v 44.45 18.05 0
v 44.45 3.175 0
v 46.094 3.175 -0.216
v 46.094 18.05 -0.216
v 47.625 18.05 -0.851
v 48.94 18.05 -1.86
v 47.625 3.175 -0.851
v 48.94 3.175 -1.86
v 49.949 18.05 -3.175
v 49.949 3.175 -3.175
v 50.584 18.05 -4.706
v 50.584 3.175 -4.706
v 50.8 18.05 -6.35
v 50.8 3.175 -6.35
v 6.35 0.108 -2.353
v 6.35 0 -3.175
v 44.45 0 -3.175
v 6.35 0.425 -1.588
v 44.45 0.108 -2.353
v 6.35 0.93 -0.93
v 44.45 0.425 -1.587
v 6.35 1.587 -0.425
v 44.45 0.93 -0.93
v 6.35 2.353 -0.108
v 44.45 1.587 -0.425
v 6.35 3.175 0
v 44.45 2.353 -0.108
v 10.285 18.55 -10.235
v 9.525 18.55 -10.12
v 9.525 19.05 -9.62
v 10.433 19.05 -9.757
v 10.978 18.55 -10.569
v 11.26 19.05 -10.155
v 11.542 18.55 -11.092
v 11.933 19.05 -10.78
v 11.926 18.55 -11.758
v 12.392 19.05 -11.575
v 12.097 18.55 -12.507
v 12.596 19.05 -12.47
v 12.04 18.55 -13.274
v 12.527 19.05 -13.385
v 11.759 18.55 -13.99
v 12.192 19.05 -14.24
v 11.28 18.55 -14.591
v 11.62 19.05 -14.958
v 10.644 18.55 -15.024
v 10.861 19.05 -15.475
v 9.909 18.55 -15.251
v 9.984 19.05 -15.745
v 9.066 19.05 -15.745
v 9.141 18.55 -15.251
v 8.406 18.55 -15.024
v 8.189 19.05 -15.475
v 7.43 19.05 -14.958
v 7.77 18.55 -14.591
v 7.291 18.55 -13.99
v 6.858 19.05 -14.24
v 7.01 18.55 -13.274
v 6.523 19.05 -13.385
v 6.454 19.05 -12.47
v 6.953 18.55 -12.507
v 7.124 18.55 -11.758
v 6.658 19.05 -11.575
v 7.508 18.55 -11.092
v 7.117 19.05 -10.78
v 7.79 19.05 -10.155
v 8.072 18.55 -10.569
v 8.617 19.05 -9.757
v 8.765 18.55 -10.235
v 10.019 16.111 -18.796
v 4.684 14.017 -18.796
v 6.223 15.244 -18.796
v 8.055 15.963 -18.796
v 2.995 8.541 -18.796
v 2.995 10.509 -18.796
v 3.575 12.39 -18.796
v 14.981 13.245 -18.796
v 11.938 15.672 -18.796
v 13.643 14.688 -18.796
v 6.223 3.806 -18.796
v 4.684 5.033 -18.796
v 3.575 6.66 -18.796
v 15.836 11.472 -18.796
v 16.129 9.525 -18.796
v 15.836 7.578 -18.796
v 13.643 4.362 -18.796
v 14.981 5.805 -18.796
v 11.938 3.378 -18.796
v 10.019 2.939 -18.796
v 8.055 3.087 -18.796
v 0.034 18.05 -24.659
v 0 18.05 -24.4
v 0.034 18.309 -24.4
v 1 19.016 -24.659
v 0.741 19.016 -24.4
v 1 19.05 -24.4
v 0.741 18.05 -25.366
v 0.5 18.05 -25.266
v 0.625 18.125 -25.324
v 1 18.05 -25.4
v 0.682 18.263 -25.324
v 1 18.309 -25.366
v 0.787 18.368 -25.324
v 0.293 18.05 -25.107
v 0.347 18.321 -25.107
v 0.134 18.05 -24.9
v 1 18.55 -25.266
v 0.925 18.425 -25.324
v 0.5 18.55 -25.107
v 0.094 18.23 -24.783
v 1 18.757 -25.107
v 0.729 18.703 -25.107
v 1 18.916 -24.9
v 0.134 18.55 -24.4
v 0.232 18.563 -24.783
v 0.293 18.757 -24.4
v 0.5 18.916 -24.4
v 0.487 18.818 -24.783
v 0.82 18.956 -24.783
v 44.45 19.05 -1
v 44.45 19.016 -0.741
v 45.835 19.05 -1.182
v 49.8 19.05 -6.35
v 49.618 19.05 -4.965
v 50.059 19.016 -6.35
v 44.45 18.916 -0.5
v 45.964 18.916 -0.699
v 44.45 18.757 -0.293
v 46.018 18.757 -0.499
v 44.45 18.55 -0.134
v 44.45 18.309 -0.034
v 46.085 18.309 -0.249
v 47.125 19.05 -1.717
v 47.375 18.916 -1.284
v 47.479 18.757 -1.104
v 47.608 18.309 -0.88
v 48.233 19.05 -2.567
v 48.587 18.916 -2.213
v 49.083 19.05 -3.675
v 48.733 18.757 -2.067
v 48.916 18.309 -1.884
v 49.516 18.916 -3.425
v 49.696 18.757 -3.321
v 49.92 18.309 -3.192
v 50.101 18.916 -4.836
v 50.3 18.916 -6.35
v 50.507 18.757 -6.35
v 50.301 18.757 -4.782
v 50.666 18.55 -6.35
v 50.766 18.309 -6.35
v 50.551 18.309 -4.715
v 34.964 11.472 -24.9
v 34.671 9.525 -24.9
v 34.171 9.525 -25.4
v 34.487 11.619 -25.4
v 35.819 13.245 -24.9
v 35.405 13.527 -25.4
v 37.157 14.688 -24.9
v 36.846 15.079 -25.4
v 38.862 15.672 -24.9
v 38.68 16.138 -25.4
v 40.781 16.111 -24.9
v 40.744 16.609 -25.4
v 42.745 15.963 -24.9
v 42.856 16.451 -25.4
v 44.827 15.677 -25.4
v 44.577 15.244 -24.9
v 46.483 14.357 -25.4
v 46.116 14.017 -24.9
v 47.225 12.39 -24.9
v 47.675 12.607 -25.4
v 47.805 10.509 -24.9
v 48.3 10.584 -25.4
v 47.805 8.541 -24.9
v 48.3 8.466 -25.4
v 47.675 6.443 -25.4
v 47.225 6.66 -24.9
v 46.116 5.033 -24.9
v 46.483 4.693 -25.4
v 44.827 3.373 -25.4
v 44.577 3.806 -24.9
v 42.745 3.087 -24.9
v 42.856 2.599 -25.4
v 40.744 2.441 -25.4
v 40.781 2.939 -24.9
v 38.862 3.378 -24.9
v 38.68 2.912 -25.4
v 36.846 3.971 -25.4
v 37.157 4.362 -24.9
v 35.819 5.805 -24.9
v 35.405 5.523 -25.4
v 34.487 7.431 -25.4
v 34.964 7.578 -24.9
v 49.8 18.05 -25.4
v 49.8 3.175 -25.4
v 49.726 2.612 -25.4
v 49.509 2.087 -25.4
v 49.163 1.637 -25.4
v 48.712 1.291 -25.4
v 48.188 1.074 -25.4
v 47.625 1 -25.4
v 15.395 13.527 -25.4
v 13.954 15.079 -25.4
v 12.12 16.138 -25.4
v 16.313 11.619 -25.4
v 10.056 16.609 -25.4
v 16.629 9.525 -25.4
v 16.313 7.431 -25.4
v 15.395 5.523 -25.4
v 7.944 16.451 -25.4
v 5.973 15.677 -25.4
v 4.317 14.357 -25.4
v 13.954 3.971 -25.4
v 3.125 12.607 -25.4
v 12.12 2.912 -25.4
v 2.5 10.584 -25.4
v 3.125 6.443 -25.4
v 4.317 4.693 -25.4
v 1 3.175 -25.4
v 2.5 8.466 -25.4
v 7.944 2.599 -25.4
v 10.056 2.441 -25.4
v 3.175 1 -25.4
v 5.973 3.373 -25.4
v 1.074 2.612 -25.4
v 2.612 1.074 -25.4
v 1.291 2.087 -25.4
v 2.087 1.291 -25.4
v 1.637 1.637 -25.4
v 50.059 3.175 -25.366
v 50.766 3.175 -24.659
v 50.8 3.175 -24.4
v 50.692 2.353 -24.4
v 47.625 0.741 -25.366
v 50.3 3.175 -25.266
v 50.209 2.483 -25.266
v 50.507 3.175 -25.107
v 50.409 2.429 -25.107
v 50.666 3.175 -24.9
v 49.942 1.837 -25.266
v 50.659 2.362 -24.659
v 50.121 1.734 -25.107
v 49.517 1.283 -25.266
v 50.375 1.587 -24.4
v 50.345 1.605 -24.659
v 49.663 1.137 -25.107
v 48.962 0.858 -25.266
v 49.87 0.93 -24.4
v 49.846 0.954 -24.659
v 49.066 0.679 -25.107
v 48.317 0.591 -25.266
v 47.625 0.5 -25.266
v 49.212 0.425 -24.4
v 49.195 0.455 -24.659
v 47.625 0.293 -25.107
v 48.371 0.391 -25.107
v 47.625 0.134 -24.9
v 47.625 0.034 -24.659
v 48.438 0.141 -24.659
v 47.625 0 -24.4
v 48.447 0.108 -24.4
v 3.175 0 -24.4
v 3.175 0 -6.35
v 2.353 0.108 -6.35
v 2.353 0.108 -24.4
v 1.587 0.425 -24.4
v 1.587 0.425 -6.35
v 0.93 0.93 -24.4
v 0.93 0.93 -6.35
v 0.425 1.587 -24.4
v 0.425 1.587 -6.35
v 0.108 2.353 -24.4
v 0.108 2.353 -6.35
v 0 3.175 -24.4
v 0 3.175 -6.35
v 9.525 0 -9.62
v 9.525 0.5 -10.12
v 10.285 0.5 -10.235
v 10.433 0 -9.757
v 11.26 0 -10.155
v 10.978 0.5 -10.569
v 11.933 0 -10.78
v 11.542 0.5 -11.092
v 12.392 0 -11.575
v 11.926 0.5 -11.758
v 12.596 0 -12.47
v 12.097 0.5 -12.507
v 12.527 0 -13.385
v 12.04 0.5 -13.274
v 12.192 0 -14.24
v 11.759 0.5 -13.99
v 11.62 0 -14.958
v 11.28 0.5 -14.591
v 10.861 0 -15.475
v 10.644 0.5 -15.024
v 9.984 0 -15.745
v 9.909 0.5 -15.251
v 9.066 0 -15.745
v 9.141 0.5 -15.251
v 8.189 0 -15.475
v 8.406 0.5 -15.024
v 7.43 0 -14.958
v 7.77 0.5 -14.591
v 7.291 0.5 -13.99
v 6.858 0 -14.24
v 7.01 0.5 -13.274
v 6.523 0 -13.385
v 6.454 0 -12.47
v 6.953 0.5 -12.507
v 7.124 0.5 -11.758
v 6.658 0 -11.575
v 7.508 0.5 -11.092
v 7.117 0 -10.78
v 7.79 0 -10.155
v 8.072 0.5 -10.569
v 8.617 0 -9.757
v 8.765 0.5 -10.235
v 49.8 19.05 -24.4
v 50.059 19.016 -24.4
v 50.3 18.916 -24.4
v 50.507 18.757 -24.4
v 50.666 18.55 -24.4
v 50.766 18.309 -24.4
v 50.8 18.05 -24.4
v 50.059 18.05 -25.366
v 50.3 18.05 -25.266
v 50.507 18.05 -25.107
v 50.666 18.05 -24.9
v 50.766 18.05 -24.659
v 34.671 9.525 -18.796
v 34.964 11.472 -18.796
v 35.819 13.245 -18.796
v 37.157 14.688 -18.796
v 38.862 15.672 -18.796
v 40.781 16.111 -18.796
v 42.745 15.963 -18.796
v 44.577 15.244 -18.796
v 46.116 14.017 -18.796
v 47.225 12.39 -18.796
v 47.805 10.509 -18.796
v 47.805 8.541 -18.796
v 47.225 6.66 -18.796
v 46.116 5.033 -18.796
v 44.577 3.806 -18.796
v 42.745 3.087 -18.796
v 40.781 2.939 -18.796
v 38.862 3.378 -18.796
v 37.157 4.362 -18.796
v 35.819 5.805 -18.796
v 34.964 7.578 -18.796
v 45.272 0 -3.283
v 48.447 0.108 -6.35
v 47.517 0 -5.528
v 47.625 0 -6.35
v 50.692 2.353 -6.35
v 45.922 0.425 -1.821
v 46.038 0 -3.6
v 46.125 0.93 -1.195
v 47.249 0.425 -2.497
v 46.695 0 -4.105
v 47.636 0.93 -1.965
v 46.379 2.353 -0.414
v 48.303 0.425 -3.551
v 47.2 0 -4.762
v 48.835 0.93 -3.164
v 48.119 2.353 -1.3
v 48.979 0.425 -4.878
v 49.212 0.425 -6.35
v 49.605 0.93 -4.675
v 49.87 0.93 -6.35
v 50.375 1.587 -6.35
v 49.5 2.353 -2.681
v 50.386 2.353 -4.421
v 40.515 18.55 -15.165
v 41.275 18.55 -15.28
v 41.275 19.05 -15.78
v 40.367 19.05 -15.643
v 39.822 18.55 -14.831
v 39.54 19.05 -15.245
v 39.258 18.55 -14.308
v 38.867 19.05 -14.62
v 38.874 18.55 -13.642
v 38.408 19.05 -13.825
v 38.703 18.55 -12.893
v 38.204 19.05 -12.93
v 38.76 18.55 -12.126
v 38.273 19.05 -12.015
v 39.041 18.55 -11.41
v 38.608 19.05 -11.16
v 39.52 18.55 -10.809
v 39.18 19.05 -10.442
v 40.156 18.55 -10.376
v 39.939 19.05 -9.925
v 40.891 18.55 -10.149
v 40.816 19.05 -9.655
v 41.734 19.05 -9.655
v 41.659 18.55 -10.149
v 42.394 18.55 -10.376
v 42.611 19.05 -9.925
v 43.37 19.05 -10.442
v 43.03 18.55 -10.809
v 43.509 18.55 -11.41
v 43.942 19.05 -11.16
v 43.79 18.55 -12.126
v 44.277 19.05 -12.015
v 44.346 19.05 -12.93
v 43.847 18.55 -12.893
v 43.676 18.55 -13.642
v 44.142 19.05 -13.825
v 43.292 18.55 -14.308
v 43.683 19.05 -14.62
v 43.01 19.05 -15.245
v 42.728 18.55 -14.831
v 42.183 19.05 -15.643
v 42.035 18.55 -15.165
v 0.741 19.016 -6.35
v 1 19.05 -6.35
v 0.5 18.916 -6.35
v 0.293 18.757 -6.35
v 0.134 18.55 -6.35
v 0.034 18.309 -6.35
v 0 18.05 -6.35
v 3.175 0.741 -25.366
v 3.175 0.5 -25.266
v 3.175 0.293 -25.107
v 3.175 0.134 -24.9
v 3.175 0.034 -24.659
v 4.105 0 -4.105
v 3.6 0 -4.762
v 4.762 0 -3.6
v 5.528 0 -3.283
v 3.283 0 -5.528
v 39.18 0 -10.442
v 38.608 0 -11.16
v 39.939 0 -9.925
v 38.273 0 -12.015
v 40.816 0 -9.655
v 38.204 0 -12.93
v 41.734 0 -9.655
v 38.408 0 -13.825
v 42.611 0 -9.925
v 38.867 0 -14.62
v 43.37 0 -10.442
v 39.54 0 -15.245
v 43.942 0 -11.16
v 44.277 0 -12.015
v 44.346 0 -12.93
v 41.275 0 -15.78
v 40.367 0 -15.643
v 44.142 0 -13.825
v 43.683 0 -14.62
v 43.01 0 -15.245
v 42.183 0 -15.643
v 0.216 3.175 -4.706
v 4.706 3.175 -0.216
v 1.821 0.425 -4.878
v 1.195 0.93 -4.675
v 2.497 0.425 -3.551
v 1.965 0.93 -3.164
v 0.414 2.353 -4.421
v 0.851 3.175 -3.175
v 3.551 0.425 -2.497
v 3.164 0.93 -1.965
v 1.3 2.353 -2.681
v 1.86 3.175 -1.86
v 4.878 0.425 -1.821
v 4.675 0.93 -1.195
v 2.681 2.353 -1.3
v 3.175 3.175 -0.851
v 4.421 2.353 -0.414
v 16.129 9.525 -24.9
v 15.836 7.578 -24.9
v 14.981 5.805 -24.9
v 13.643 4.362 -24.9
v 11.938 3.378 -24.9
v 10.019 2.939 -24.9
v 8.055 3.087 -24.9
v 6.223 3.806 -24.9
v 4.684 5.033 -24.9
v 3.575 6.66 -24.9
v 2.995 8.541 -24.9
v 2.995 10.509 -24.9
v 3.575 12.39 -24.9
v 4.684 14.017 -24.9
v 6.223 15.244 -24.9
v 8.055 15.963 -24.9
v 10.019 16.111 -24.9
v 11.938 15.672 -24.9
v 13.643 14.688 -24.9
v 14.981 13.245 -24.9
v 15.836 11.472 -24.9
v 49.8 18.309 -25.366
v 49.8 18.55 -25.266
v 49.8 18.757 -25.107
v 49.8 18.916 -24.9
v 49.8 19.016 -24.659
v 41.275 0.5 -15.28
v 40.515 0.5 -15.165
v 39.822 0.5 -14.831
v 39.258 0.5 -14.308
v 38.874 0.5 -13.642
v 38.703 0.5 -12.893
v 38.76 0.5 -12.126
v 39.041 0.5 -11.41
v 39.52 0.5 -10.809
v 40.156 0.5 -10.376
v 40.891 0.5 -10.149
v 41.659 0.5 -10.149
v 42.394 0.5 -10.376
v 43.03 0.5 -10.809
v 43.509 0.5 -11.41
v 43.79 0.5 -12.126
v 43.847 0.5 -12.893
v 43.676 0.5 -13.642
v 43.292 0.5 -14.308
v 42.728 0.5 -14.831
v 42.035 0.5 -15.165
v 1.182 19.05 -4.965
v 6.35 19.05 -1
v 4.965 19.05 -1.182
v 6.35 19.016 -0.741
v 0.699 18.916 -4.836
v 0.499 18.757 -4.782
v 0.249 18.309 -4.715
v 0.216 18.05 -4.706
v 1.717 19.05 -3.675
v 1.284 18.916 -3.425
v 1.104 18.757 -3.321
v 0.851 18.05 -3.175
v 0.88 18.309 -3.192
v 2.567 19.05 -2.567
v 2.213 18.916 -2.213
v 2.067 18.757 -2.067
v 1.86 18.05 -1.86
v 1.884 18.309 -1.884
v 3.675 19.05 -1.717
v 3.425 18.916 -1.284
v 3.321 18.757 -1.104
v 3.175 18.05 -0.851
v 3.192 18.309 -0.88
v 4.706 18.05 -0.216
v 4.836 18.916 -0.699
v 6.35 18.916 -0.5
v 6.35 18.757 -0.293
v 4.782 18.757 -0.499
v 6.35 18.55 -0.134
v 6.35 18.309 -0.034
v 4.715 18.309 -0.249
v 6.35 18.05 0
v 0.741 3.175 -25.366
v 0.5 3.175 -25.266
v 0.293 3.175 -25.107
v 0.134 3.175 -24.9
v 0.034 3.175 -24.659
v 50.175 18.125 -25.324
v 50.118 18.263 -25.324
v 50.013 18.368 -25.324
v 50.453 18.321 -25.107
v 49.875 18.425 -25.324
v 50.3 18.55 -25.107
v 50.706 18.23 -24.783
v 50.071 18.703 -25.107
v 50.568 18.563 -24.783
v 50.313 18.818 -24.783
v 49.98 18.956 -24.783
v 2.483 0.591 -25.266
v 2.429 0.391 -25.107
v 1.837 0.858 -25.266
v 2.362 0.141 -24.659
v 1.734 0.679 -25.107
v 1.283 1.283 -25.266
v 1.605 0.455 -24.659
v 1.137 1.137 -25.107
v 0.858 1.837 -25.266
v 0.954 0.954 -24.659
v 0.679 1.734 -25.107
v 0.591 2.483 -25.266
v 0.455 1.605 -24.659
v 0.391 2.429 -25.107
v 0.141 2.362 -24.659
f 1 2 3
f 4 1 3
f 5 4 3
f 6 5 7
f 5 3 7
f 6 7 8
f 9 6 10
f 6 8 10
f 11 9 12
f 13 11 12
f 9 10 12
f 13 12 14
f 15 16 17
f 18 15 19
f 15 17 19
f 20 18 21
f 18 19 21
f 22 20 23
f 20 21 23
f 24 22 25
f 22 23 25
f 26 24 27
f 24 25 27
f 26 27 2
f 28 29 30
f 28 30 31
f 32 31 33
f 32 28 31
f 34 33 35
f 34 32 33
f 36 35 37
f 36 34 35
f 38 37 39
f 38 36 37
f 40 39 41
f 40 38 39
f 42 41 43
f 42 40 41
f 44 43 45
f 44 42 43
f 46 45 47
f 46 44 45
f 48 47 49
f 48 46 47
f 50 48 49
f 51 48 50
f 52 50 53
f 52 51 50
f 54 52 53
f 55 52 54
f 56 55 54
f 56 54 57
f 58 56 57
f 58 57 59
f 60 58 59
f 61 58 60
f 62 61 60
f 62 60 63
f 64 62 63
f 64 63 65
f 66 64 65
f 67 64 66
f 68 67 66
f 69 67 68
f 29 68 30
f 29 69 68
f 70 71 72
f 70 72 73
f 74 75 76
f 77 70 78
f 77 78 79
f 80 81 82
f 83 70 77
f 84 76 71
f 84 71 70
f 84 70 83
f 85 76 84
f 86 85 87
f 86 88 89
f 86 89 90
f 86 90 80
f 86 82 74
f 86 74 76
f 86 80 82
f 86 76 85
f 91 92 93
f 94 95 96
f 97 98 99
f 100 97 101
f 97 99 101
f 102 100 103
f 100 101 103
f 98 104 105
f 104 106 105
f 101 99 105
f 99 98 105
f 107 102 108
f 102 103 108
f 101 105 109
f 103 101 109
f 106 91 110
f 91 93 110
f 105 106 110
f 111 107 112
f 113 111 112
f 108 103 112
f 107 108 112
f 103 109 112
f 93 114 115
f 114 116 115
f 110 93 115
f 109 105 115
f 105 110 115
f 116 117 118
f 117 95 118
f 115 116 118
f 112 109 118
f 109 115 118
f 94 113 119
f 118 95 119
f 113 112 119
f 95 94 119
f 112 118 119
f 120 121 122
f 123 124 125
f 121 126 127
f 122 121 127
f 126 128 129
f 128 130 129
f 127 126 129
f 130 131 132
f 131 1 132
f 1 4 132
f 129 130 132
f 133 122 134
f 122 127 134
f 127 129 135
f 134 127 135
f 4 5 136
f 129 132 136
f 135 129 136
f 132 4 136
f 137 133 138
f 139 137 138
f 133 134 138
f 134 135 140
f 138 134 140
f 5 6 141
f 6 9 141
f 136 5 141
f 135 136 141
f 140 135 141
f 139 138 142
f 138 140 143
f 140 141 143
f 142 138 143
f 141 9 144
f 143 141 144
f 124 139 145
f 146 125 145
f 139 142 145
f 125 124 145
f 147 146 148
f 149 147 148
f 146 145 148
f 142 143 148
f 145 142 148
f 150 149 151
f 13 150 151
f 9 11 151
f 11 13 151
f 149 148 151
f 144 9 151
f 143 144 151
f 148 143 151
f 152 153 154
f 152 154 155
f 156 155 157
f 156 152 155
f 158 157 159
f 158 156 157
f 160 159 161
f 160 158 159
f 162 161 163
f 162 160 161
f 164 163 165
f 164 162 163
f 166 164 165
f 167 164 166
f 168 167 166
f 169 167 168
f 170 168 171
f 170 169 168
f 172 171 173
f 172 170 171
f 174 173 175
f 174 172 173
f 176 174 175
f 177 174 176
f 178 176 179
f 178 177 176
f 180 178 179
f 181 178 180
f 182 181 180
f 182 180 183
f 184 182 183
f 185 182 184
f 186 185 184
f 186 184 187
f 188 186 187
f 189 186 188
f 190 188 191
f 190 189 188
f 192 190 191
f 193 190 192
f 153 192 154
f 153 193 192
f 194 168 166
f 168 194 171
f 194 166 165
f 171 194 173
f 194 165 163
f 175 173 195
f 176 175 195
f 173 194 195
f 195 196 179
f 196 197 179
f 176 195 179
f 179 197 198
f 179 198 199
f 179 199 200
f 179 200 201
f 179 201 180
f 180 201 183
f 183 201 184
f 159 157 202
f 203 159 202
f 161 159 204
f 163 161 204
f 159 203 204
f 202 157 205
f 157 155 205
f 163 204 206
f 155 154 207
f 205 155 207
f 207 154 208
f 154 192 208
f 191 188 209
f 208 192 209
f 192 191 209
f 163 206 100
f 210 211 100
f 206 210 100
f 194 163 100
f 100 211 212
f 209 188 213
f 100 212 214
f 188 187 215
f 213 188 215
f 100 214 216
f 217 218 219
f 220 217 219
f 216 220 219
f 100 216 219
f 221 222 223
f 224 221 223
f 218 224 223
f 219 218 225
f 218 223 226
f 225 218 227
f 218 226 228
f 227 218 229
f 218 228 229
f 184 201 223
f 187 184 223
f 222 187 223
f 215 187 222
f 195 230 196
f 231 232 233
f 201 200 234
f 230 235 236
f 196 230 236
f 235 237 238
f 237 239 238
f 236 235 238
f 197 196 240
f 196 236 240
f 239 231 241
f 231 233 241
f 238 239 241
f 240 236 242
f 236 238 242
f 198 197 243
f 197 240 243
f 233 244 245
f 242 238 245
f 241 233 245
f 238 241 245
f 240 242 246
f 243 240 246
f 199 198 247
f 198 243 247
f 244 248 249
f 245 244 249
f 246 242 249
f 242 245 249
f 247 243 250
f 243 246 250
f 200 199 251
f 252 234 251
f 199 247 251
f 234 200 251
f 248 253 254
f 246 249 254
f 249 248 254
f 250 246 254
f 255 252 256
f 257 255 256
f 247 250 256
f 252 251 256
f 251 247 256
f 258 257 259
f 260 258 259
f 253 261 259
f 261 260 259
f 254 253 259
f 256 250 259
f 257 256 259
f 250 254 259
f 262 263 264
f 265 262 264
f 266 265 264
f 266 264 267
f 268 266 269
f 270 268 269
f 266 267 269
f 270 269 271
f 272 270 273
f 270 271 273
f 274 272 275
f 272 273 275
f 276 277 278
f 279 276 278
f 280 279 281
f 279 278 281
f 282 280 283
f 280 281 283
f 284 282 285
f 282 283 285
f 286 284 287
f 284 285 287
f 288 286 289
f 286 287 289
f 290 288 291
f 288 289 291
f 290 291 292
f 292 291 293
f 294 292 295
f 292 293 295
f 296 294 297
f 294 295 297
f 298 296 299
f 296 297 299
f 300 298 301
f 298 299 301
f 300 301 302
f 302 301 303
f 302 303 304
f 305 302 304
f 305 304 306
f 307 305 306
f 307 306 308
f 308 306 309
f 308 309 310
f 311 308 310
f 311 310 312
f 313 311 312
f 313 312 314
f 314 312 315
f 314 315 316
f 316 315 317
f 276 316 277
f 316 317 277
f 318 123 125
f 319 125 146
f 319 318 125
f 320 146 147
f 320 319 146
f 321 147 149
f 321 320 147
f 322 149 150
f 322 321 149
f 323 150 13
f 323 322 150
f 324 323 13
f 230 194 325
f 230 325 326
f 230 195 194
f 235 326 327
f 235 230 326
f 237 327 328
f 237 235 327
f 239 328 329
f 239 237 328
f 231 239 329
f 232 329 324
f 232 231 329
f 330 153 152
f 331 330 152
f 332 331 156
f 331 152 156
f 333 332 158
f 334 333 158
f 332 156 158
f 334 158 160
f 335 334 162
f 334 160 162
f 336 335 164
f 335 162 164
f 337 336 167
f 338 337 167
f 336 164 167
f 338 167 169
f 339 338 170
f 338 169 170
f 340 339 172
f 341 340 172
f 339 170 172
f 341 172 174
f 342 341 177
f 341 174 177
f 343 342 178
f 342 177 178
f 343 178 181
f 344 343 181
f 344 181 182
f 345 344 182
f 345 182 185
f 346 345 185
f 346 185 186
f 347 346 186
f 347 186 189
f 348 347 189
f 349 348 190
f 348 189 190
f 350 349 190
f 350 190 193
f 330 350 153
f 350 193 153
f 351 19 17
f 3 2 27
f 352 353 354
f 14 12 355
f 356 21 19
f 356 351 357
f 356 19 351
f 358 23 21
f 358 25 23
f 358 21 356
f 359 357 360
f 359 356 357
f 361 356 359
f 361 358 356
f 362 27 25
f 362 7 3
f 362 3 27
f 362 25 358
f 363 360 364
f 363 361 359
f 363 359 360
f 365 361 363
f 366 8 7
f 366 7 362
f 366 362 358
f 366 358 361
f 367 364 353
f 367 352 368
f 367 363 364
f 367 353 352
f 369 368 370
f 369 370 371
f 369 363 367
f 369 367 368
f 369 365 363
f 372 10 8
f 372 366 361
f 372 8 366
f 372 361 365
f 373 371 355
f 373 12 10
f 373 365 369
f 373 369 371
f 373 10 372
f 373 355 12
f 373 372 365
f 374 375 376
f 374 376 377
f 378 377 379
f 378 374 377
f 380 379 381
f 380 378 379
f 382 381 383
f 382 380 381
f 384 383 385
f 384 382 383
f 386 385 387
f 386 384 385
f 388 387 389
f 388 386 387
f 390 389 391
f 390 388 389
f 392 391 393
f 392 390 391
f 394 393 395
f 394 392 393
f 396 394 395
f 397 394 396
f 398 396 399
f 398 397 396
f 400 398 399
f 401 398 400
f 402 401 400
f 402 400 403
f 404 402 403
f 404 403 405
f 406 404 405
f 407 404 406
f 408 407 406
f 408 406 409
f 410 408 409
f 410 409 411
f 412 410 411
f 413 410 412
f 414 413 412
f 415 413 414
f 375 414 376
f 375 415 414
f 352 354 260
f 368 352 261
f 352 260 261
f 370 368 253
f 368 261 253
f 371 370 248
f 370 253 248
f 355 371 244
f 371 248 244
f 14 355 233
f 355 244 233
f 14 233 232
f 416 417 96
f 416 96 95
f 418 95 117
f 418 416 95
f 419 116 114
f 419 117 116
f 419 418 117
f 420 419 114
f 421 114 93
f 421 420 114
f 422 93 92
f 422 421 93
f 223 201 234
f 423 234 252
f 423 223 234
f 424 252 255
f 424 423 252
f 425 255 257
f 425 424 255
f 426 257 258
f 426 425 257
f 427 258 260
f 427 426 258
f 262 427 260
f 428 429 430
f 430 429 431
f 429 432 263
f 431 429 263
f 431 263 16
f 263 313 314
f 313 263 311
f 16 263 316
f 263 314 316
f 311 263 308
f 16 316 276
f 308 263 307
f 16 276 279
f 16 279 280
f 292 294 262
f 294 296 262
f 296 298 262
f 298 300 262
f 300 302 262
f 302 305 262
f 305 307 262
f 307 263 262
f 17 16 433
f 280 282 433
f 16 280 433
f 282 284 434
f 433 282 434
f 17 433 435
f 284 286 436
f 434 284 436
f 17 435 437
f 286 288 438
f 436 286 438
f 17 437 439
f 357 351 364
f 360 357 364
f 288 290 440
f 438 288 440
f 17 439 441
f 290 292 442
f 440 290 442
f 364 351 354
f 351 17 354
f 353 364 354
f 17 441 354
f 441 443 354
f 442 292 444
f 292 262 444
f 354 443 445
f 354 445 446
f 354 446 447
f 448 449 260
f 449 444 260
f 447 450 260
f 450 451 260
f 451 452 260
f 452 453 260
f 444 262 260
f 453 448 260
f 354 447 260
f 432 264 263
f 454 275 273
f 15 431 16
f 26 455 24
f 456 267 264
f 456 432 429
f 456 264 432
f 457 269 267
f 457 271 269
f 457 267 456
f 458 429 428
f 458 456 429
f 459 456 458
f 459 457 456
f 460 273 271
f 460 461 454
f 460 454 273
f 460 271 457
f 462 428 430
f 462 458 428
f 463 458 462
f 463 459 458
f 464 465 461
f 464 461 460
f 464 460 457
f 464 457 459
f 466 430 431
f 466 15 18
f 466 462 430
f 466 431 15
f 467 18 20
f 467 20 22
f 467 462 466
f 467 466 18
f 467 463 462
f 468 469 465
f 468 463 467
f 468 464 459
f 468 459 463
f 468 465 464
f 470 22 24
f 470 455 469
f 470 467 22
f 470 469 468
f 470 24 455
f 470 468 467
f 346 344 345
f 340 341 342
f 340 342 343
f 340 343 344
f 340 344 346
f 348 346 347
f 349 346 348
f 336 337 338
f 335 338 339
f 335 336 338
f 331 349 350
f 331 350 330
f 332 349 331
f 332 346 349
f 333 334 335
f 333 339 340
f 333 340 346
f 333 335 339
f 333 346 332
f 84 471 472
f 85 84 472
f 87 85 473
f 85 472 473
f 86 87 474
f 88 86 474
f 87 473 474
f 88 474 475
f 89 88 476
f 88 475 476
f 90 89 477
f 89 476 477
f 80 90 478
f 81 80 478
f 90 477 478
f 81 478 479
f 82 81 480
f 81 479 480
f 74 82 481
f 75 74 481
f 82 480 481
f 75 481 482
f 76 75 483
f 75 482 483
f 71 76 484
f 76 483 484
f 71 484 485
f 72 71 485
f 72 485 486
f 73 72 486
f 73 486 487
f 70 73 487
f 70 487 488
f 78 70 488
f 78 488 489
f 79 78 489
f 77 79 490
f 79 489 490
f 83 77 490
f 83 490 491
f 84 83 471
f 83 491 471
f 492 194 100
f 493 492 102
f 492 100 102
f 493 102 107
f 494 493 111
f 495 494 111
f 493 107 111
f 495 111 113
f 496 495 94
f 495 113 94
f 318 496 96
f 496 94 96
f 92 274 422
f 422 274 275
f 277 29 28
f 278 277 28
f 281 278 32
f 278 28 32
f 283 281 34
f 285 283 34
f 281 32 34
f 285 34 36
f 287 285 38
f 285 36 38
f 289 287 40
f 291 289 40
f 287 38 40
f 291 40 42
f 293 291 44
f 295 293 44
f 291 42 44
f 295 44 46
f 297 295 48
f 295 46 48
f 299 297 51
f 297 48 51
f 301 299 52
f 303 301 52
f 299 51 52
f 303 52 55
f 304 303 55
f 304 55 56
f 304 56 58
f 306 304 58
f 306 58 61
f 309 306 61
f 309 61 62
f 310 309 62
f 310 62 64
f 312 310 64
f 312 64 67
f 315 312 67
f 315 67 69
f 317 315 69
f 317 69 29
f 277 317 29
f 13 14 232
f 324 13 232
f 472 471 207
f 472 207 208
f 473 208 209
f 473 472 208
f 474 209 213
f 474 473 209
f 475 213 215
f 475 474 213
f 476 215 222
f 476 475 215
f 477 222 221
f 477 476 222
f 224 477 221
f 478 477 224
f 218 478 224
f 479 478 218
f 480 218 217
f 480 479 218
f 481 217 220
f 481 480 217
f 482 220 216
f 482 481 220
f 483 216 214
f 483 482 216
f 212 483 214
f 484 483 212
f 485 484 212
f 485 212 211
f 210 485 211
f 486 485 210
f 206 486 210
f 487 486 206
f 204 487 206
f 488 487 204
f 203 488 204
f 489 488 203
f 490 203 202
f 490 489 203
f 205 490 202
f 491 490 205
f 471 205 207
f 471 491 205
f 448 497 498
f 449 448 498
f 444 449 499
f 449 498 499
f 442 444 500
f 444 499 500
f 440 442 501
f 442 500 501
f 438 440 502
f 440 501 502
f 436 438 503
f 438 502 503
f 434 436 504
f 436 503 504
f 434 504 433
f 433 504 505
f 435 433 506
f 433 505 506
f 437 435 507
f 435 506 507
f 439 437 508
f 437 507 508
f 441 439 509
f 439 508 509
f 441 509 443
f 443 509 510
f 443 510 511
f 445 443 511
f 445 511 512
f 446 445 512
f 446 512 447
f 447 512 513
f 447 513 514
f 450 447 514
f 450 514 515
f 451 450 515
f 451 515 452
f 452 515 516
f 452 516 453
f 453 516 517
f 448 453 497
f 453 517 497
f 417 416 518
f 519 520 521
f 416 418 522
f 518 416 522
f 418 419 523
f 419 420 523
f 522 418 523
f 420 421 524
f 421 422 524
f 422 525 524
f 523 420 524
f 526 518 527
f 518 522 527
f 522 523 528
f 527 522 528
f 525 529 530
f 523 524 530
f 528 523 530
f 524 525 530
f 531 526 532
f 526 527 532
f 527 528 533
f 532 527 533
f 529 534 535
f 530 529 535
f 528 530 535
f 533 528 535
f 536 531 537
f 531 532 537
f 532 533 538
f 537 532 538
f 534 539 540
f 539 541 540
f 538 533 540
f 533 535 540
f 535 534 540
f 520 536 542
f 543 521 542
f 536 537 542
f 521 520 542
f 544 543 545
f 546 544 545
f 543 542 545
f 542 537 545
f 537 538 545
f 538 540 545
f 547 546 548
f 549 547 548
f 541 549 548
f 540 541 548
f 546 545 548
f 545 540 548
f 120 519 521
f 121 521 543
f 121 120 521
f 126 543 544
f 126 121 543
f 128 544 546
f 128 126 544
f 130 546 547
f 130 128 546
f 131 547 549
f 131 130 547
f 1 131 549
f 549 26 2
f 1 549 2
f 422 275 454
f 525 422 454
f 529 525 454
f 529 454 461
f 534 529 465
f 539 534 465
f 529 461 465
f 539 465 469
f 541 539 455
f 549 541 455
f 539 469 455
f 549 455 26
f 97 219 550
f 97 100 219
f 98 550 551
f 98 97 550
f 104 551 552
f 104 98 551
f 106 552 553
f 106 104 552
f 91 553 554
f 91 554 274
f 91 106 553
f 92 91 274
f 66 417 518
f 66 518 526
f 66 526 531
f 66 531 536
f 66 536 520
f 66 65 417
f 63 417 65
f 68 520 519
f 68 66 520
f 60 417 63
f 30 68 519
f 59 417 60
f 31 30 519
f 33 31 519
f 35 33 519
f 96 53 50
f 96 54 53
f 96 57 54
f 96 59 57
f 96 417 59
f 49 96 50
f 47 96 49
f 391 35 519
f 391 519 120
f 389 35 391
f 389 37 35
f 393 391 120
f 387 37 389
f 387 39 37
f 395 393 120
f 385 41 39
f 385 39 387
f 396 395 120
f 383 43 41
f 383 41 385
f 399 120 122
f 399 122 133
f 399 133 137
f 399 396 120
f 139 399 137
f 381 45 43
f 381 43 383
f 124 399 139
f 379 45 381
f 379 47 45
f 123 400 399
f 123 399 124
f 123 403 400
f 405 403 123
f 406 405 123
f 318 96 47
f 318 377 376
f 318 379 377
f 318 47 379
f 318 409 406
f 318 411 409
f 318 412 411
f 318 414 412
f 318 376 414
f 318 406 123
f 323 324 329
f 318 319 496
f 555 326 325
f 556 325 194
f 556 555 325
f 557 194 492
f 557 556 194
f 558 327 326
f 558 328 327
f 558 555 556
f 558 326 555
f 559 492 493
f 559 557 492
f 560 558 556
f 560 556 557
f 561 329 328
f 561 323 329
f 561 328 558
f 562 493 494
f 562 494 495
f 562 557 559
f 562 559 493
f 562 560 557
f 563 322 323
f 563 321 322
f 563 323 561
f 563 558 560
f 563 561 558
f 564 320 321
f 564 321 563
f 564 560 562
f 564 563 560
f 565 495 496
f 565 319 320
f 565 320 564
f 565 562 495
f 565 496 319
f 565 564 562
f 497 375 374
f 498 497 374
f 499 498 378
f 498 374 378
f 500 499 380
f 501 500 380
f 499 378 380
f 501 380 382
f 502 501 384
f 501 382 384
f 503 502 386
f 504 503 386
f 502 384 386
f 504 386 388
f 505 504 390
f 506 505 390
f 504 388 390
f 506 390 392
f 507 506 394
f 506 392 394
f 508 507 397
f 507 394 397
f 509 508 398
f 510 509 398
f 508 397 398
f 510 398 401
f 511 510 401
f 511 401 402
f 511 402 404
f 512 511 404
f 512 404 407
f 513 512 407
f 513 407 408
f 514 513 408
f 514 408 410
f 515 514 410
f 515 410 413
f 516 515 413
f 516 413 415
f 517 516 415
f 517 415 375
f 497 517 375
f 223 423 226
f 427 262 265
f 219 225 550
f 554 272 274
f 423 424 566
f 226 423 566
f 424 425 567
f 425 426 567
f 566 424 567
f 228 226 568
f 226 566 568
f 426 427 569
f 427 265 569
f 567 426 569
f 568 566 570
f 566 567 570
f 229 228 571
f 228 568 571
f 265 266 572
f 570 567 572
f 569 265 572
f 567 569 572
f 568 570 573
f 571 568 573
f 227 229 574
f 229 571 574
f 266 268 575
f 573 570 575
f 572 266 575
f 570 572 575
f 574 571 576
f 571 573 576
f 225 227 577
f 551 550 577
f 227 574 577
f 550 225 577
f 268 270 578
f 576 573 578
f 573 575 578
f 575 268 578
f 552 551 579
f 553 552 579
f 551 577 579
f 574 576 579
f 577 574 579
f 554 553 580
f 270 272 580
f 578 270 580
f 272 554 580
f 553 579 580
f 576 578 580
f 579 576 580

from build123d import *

# Parameters (mm, degrees)
BOSS_EXTRUDE1_DEPTH = 19.05
SKETCH2_R           = 2.5796875
CUT_EXTRUDE1_DEPTH  = 20.05
SKETCH3_R           = 6.604
CUT_EXTRUDE2_DEPTH  = 6.604
CHAMFER1_SIZE       = 0.5
FILLET1_R           = 3.175
FILLET2_R           = 1


with BuildPart() as part:
    # Sketch1 → Boss-Extrude1 (new body)
    with BuildSketch(Plane(origin=(0, 0, 0), x_dir=(1, 0, 0), z_dir=(0, 1, 0))):
        with BuildLine():
            Line((6.35, 0), (44.45, 0))
            ThreePointArc((44.45, 0), (48.940128061, 1.859871939), (50.8, 6.35))
            Line((50.8, 6.35), (50.8, 25.4))
            Line((50.8, 25.4), (0, 25.4))
            Line((0, 25.4), (0, 6.35))
            ThreePointArc((0, 6.35), (1.859871939, 1.859871939), (6.35, 0))
        make_face()
    extrude(amount=BOSS_EXTRUDE1_DEPTH)

    # Sketch2 → Cut-Extrude1 (cut, through all)
    with BuildSketch(Plane(origin=(0, 19.05, 0), x_dir=(1, 0, 0), z_dir=(0, 1, 0))):
        with Locations(Location((9.525, 12.7, 0), (0, 0, 270))):  # turned: the seam where the file's is
            Circle(SKETCH2_R)
        with Locations(Location((41.275, 12.7, 0), (0, 0, 90))):  # turned: the seam where the file's is
            Circle(SKETCH2_R)
    extrude(amount=-CUT_EXTRUDE1_DEPTH, mode=Mode.SUBTRACT)

    # Sketch3 → Cut-Extrude2 (cut)
    with BuildSketch(Plane(origin=(0, 0, -25.4), x_dir=(-1, 0, 0), z_dir=(0, 0, -1))):
        with Locations((-41.275, 9.525)):
            Circle(SKETCH3_R)
        with Locations(Location((-9.525, 9.525, 0), (0, 0, 180))):  # turned: the seam where the file's is
            Circle(SKETCH3_R)
    extrude(amount=-CUT_EXTRUDE2_DEPTH, mode=Mode.SUBTRACT)

    # Chamfer1
    chamfer1_edges = [part.edges().sort_by_distance(p)[0] for p in [
        (9.525, 0, -15.2796875),
        (9.525, 19.05, -15.2796875),
        (41.275, 0, -10.1203125),
        (41.275, 19.05, -10.1203125),
        (47.879, 9.525, -25.4),
        (2.921, 9.525, -25.4),
    ]]
    chamfer(chamfer1_edges, length=CHAMFER1_SIZE)

    # Fillet1
    fillet1_edges = [part.edges().sort_by_distance(p)[0] for p in [
        (48.940128061, 0, -1.859871939),
        (25.4, 0, 0),
        (1.859871939, 0, -1.859871939),
        (0, 0, -15.875),
        (50.8, 0, -15.875),
    ]]
    fillet(fillet1_edges, radius=FILLET1_R)

    # Fillet2
    fillet2_edges = [part.edges().sort_by_distance(p)[0] for p in [
        (0, 19.05, -15.875),
        (0, 11.1125, -25.4),
        (50.8, 11.1125, -25.4),
        (1.859871939, 19.05, -1.859871939),
        (25.4, 19.05, 0),
        (48.940128061, 19.05, -1.859871939),
        (50.8, 19.05, -15.875),
        (25.4, 0, -25.4),
        (49.87006403, 0.92993597, -25.4),
        (0.92993597, 0.92993597, -25.4),
        (25.4, 19.05, -25.4),
    ]]
    fillet(fillet2_edges, radius=FILLET2_R)


solid = part.part
